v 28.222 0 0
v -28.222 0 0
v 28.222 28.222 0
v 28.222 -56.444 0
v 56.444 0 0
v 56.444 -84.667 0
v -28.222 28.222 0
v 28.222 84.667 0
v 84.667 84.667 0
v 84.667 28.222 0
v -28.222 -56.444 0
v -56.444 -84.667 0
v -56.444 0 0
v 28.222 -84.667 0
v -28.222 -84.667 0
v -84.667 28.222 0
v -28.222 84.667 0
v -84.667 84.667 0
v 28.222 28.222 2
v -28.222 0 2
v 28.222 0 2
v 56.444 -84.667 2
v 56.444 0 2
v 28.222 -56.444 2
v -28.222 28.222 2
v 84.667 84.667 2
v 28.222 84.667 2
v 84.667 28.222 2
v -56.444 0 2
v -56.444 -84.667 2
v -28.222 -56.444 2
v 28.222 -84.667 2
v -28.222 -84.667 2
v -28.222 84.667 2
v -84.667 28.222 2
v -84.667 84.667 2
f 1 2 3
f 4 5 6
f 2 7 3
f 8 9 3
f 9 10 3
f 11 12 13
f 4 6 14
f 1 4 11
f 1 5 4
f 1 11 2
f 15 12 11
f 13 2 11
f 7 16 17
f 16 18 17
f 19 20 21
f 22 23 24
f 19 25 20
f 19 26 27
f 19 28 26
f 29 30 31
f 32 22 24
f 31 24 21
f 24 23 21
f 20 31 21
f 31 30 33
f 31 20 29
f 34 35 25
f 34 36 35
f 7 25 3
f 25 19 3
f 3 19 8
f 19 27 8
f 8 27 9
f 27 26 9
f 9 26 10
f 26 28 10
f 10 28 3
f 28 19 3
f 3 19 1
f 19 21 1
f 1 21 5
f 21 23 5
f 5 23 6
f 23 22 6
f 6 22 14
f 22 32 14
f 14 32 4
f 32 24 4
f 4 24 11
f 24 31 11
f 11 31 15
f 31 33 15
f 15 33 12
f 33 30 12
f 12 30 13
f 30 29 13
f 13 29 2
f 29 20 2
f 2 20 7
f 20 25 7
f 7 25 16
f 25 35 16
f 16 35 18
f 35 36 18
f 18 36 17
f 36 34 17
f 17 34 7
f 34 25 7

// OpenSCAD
// Module names are of the form poly_<inkscape-path-id>().  As a result,
// you can associate a polygon in this OpenSCAD program with the corresponding
// SVG element in the Inkscape document by looking for the XML element with
// the attribute id="inkscape-path-id".

// fudge value is used to ensure that subtracted solids are a tad taller
// in the z dimension than the polygon being subtracted from.  This helps
// keep the resulting .stl file manifold.
fudge = 0.1;

module poly_Selection(h)
{
  scale([25.4/90, -25.4/90, 1]) union()
  {
    linear_extrude(height=h)
      polygon([[-100.000000,-300.000000],[-100.000000,-100.000000],[100.000000,-100.000000],[100.000000,-300.000000],[300.000000,-300.000000],[300.000000,-100.000000],[100.000000,-100.000000],[100.000000,0.000000],[200.000000,0.000000],[200.000000,300.000000],[100.000000,300.000000],[100.000000,200.000000],[-100.000000,200.000000],[-100.000000,300.000000],[-200.000000,300.000000],[-200.000000,0.000000],[-100.000000,0.000000],[-100.000000,-100.000000],[-300.000000,-100.000000],[-300.000000,-300.000000],[-100.000000,-300.000000]]);
  }
}

module creeperface(h)
{

poly_Selection(h);
}

creeperface(2);
